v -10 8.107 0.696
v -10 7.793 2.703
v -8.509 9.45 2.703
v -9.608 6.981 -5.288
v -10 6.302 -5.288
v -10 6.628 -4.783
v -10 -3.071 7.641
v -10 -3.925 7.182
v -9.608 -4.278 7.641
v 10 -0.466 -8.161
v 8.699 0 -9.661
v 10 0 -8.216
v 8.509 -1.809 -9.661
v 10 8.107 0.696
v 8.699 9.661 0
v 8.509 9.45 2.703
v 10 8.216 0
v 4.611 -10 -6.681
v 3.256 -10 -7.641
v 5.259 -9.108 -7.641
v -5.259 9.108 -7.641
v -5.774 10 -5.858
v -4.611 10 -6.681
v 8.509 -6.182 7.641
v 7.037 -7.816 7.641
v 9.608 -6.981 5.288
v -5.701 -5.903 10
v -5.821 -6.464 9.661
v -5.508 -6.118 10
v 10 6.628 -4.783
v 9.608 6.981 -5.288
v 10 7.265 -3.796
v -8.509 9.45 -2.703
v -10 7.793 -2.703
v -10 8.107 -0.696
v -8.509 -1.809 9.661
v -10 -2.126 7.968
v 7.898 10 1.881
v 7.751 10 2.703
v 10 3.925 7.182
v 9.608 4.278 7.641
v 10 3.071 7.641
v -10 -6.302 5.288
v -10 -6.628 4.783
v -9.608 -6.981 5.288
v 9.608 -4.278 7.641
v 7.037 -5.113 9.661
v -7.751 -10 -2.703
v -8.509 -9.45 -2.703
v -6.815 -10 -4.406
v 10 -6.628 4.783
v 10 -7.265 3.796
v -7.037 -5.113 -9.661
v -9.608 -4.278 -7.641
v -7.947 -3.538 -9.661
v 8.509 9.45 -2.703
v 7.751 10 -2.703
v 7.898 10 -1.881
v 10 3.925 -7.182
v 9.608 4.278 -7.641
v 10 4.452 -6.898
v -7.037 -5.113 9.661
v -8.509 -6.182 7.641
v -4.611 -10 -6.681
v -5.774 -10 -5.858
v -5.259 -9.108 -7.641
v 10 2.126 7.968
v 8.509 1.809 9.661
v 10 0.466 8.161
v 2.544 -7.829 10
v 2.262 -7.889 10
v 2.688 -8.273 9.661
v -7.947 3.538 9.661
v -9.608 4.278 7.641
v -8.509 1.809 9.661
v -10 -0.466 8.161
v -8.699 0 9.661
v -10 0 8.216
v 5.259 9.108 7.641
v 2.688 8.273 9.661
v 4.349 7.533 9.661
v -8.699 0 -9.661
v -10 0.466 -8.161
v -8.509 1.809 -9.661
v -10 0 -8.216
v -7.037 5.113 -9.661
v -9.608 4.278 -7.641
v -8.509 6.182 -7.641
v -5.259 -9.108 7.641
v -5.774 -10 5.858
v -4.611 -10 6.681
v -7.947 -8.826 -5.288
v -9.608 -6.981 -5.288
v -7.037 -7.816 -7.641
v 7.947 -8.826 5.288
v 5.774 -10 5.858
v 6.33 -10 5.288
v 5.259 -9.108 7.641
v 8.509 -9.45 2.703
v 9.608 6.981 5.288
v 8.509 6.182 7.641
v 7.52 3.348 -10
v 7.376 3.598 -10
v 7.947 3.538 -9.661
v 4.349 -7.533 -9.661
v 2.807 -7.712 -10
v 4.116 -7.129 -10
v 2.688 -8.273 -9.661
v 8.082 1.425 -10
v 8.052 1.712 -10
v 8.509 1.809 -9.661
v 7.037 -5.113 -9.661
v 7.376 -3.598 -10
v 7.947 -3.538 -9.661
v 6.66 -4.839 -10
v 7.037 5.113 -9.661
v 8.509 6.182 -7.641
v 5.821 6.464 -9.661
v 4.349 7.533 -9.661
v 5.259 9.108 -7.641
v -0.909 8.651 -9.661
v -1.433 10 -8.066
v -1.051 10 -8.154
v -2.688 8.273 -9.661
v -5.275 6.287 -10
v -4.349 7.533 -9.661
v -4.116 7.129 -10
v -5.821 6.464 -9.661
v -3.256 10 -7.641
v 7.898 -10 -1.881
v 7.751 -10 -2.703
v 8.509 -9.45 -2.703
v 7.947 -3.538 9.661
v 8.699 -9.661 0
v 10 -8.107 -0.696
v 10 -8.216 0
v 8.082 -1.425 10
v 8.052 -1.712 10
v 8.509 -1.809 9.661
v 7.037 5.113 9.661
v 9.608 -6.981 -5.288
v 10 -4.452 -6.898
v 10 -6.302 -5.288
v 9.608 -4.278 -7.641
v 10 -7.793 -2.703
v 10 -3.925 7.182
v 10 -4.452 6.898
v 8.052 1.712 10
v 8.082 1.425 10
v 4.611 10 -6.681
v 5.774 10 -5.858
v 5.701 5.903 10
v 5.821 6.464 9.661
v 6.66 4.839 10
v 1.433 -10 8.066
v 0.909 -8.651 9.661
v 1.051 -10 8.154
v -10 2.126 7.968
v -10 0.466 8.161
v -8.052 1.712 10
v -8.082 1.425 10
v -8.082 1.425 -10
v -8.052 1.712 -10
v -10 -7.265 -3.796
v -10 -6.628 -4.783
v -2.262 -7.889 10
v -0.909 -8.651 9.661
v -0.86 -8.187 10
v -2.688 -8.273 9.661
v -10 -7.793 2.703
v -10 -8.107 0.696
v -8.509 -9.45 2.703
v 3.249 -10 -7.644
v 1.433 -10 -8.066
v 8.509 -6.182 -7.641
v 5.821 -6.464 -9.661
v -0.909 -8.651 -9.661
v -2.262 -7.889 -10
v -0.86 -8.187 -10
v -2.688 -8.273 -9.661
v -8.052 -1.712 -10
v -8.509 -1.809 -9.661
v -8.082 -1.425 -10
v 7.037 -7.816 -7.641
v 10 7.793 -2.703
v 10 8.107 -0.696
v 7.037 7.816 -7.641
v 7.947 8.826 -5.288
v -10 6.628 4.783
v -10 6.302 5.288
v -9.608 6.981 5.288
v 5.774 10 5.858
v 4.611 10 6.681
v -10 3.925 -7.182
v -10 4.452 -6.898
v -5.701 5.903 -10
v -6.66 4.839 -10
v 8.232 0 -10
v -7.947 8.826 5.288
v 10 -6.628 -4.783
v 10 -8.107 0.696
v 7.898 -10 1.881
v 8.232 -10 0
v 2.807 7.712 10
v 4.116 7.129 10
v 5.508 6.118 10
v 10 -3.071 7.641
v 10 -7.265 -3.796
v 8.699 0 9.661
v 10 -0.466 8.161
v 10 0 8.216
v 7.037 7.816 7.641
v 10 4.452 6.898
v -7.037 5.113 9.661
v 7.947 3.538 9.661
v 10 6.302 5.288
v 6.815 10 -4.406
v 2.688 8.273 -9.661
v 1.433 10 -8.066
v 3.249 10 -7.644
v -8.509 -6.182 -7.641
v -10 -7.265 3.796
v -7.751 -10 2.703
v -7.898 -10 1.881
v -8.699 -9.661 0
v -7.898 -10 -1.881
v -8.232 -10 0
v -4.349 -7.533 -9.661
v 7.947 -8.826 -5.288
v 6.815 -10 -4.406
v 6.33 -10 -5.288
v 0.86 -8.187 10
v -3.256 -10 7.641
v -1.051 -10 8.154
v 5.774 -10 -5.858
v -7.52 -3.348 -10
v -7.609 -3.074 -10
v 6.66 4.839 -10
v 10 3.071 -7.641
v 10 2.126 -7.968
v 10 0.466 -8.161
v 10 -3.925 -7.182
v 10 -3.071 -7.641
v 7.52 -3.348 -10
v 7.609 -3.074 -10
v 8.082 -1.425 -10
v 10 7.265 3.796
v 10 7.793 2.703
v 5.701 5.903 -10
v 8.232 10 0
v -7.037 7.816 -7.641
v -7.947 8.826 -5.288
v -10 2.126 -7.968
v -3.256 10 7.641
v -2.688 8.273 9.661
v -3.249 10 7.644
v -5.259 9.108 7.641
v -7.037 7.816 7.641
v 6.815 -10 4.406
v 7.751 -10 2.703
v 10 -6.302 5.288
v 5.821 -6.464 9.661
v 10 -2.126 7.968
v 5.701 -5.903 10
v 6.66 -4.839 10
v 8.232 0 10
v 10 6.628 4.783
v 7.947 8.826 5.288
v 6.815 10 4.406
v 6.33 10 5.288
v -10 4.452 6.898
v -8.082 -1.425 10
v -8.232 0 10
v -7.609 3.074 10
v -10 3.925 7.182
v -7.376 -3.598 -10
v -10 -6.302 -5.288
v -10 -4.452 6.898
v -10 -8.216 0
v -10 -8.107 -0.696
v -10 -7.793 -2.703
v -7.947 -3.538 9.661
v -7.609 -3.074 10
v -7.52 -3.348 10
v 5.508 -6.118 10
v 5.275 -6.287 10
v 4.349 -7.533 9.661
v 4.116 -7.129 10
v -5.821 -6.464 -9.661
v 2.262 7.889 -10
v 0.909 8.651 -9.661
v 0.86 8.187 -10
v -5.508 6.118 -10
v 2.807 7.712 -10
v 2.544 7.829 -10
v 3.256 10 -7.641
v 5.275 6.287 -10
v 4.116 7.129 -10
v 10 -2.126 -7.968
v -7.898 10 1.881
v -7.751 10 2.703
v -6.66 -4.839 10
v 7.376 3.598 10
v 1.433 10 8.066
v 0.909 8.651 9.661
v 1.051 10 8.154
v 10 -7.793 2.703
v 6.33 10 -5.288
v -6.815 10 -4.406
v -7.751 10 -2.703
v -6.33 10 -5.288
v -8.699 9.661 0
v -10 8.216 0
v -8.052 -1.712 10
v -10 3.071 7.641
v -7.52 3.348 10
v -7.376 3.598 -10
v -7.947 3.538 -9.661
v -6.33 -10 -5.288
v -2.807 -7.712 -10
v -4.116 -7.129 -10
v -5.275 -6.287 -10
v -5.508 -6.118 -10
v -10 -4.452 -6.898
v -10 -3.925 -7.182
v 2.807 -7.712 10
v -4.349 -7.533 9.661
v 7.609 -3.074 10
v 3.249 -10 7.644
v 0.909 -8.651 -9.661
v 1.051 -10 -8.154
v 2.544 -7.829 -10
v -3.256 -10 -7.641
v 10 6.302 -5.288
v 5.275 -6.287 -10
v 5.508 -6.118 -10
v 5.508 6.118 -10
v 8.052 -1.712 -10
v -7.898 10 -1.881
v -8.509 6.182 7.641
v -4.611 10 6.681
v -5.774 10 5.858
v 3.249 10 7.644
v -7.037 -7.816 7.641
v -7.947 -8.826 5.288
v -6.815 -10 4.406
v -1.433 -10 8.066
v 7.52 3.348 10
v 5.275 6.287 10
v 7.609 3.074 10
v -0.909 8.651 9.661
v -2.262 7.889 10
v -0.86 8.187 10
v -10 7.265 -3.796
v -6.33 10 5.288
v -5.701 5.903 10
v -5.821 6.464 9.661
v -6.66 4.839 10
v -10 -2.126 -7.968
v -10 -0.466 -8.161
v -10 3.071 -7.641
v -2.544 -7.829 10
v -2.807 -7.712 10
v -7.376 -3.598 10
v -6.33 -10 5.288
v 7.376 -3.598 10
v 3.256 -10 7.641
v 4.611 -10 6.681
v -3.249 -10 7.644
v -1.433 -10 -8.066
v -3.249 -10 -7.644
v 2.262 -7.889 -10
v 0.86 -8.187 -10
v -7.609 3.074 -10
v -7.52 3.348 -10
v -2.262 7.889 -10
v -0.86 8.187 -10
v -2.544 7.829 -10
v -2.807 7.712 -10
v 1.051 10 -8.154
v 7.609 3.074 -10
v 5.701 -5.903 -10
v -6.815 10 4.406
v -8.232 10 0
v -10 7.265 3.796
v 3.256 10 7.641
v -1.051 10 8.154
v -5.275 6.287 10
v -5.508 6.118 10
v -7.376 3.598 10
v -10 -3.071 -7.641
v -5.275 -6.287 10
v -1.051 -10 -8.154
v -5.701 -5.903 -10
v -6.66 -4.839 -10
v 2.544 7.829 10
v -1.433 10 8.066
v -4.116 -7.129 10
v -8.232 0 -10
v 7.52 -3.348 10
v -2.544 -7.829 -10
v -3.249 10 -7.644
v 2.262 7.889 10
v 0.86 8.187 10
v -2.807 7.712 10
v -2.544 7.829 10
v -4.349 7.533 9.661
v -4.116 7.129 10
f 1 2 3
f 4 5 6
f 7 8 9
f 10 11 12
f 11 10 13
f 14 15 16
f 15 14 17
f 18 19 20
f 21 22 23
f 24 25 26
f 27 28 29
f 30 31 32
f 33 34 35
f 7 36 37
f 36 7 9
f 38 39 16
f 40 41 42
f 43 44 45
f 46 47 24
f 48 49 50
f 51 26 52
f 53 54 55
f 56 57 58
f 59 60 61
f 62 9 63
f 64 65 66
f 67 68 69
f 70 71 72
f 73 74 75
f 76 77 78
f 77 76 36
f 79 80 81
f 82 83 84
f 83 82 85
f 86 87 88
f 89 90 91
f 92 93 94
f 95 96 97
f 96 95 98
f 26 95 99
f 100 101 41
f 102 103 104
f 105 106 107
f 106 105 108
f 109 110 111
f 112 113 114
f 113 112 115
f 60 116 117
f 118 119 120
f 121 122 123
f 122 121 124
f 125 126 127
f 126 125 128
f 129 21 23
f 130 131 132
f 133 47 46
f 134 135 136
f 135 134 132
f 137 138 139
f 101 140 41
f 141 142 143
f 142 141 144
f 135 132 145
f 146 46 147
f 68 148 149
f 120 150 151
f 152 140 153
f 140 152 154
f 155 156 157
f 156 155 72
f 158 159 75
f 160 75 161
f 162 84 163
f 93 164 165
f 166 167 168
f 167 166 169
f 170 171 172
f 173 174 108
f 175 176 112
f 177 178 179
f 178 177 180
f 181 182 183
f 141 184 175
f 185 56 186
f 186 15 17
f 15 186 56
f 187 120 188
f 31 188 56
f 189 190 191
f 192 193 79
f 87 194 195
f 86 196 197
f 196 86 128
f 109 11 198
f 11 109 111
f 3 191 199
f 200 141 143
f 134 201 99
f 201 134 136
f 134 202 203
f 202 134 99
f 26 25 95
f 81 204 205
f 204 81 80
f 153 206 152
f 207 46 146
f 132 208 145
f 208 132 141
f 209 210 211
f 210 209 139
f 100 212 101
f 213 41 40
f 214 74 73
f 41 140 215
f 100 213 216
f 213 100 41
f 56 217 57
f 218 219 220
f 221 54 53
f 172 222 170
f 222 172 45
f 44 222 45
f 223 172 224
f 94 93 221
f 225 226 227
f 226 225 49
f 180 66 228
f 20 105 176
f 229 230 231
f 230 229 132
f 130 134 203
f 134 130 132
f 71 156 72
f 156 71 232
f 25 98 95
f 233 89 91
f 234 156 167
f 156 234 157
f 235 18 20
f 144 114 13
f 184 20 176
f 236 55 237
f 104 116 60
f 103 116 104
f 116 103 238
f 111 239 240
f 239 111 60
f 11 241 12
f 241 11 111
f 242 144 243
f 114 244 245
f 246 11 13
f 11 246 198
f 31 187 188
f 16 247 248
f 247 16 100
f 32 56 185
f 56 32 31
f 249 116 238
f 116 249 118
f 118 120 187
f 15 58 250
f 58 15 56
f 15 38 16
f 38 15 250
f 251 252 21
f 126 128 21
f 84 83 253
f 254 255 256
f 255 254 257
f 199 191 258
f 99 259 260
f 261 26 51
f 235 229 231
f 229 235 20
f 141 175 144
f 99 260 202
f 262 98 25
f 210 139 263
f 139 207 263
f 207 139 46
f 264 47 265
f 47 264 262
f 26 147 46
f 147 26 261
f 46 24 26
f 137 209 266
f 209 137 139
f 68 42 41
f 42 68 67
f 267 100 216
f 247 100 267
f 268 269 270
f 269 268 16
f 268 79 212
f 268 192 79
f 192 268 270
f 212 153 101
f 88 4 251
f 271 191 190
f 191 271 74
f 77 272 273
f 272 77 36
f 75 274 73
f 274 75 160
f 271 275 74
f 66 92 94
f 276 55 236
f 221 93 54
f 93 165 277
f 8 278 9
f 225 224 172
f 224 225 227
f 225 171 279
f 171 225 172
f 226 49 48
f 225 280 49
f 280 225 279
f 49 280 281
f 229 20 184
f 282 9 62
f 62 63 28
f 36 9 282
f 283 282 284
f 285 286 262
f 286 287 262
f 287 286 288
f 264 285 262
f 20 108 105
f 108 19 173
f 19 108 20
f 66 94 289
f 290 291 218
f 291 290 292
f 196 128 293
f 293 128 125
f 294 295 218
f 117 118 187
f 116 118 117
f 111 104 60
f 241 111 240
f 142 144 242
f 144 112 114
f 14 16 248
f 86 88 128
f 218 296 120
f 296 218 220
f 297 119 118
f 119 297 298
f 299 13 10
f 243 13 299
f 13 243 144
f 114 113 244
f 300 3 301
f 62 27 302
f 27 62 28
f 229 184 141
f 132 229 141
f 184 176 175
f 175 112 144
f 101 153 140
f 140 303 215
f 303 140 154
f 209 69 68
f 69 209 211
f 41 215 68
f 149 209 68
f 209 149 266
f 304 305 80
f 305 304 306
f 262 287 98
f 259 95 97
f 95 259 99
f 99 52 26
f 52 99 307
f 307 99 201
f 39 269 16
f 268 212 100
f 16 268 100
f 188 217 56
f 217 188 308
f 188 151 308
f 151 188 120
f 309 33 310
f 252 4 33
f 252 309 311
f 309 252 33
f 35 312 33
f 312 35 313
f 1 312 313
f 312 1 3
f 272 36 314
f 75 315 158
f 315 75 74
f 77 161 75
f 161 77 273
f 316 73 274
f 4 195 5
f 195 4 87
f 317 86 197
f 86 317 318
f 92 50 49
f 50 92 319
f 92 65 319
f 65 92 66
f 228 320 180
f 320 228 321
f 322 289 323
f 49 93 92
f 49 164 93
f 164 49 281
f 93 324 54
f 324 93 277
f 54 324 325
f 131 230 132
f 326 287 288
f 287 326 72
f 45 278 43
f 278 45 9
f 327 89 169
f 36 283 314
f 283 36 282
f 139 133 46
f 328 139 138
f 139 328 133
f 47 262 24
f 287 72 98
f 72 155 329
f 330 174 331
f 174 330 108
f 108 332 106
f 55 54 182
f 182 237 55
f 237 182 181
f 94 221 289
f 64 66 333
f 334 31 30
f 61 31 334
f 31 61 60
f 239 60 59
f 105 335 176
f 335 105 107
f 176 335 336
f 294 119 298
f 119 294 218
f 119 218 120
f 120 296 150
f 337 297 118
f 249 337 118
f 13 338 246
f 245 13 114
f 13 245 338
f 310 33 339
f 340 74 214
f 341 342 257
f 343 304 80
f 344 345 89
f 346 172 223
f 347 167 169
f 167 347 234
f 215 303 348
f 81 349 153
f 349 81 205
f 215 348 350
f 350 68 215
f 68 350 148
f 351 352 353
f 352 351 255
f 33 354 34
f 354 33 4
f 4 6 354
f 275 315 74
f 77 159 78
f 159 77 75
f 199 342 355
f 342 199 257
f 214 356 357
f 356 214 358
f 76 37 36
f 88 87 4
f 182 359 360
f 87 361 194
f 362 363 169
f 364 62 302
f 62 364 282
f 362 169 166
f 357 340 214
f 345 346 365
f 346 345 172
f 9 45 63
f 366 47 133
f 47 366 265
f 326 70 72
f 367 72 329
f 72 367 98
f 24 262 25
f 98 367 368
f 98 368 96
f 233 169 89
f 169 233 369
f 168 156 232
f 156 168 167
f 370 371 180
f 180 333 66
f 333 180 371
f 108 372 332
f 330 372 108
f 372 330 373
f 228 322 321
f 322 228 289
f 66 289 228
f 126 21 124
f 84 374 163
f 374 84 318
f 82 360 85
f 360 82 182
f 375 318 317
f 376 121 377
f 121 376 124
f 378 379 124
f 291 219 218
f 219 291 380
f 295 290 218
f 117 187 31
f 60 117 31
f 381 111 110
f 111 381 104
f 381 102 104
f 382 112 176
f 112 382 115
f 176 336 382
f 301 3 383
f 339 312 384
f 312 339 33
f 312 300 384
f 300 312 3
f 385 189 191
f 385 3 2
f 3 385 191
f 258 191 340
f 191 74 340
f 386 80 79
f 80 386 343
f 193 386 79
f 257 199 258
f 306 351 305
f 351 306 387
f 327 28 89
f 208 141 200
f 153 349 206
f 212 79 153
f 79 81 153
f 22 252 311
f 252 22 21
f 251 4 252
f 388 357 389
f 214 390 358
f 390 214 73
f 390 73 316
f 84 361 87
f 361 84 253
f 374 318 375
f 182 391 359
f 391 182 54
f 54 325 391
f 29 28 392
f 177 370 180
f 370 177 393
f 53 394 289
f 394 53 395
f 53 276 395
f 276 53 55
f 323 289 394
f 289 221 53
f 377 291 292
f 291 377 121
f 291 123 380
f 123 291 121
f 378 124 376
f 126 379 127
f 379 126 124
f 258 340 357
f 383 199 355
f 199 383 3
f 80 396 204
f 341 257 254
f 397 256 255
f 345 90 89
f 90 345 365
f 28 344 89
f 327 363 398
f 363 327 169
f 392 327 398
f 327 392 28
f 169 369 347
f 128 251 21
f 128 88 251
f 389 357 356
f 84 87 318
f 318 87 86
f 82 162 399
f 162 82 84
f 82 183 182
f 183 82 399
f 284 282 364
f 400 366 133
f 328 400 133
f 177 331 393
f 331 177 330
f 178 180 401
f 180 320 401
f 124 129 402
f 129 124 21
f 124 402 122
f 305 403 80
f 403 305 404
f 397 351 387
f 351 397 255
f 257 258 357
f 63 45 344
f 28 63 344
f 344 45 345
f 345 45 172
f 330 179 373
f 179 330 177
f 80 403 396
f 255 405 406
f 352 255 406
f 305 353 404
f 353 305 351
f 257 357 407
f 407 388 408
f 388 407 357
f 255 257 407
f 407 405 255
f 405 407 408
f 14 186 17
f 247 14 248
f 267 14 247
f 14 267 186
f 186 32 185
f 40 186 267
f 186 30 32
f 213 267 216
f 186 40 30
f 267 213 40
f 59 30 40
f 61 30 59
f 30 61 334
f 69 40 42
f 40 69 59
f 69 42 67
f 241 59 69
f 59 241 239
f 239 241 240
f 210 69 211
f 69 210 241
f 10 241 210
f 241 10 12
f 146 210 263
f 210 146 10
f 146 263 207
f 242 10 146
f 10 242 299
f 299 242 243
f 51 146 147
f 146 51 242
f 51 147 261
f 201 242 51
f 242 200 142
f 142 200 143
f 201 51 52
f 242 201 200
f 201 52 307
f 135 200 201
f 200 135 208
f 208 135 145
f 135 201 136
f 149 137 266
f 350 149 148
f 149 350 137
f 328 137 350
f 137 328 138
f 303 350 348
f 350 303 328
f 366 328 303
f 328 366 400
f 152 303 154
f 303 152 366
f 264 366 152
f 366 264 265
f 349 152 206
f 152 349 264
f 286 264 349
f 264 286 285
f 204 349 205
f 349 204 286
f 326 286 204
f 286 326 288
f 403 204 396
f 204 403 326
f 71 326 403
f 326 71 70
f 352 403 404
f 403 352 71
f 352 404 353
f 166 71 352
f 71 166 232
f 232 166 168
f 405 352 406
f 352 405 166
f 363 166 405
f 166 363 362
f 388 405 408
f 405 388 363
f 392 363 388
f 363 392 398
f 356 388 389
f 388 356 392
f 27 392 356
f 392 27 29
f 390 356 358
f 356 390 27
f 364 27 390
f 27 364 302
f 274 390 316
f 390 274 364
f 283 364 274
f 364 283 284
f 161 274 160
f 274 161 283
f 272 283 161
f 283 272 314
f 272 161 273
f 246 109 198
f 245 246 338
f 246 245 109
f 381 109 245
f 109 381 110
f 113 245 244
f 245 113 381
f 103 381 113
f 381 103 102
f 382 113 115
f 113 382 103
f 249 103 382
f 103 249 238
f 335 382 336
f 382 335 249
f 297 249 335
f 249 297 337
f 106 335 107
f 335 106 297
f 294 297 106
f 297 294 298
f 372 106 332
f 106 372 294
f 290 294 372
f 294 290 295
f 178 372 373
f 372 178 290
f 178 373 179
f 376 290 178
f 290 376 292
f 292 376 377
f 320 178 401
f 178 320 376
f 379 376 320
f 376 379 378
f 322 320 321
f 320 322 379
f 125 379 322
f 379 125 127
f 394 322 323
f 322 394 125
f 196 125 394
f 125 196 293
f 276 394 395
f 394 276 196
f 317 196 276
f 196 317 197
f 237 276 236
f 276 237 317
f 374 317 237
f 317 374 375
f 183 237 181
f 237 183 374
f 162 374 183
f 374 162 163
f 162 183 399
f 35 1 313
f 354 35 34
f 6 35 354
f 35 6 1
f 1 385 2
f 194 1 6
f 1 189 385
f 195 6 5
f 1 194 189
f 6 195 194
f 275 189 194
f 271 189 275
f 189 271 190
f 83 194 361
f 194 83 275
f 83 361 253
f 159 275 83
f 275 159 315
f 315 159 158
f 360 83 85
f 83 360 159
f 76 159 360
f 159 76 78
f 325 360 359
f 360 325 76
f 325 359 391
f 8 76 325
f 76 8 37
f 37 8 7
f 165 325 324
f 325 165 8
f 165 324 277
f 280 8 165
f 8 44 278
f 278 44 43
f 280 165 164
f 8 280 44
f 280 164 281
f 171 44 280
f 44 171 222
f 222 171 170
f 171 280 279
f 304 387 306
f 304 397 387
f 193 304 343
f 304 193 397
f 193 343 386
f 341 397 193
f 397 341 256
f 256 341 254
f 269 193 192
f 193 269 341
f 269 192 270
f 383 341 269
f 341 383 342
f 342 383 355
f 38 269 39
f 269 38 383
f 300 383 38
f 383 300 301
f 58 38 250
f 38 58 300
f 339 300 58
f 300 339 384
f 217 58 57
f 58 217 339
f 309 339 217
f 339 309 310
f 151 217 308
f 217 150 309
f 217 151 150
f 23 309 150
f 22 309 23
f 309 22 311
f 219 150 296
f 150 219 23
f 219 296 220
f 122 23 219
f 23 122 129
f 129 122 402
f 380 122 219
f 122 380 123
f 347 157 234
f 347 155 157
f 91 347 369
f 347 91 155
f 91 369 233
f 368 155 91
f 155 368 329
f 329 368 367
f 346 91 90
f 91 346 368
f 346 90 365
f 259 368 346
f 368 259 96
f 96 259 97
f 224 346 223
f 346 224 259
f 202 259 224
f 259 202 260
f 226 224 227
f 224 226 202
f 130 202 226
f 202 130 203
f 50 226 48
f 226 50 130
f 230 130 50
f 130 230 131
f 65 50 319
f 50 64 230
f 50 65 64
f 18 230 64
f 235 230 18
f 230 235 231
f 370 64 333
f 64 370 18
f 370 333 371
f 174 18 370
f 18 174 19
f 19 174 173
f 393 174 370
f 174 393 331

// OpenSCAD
module mycube()
{
    difference ()
    {
        cube (20, center = true);
        difference ()
        {
            cube (40, center = true);
            sphere (13);
        }
    }
}

mycube();
